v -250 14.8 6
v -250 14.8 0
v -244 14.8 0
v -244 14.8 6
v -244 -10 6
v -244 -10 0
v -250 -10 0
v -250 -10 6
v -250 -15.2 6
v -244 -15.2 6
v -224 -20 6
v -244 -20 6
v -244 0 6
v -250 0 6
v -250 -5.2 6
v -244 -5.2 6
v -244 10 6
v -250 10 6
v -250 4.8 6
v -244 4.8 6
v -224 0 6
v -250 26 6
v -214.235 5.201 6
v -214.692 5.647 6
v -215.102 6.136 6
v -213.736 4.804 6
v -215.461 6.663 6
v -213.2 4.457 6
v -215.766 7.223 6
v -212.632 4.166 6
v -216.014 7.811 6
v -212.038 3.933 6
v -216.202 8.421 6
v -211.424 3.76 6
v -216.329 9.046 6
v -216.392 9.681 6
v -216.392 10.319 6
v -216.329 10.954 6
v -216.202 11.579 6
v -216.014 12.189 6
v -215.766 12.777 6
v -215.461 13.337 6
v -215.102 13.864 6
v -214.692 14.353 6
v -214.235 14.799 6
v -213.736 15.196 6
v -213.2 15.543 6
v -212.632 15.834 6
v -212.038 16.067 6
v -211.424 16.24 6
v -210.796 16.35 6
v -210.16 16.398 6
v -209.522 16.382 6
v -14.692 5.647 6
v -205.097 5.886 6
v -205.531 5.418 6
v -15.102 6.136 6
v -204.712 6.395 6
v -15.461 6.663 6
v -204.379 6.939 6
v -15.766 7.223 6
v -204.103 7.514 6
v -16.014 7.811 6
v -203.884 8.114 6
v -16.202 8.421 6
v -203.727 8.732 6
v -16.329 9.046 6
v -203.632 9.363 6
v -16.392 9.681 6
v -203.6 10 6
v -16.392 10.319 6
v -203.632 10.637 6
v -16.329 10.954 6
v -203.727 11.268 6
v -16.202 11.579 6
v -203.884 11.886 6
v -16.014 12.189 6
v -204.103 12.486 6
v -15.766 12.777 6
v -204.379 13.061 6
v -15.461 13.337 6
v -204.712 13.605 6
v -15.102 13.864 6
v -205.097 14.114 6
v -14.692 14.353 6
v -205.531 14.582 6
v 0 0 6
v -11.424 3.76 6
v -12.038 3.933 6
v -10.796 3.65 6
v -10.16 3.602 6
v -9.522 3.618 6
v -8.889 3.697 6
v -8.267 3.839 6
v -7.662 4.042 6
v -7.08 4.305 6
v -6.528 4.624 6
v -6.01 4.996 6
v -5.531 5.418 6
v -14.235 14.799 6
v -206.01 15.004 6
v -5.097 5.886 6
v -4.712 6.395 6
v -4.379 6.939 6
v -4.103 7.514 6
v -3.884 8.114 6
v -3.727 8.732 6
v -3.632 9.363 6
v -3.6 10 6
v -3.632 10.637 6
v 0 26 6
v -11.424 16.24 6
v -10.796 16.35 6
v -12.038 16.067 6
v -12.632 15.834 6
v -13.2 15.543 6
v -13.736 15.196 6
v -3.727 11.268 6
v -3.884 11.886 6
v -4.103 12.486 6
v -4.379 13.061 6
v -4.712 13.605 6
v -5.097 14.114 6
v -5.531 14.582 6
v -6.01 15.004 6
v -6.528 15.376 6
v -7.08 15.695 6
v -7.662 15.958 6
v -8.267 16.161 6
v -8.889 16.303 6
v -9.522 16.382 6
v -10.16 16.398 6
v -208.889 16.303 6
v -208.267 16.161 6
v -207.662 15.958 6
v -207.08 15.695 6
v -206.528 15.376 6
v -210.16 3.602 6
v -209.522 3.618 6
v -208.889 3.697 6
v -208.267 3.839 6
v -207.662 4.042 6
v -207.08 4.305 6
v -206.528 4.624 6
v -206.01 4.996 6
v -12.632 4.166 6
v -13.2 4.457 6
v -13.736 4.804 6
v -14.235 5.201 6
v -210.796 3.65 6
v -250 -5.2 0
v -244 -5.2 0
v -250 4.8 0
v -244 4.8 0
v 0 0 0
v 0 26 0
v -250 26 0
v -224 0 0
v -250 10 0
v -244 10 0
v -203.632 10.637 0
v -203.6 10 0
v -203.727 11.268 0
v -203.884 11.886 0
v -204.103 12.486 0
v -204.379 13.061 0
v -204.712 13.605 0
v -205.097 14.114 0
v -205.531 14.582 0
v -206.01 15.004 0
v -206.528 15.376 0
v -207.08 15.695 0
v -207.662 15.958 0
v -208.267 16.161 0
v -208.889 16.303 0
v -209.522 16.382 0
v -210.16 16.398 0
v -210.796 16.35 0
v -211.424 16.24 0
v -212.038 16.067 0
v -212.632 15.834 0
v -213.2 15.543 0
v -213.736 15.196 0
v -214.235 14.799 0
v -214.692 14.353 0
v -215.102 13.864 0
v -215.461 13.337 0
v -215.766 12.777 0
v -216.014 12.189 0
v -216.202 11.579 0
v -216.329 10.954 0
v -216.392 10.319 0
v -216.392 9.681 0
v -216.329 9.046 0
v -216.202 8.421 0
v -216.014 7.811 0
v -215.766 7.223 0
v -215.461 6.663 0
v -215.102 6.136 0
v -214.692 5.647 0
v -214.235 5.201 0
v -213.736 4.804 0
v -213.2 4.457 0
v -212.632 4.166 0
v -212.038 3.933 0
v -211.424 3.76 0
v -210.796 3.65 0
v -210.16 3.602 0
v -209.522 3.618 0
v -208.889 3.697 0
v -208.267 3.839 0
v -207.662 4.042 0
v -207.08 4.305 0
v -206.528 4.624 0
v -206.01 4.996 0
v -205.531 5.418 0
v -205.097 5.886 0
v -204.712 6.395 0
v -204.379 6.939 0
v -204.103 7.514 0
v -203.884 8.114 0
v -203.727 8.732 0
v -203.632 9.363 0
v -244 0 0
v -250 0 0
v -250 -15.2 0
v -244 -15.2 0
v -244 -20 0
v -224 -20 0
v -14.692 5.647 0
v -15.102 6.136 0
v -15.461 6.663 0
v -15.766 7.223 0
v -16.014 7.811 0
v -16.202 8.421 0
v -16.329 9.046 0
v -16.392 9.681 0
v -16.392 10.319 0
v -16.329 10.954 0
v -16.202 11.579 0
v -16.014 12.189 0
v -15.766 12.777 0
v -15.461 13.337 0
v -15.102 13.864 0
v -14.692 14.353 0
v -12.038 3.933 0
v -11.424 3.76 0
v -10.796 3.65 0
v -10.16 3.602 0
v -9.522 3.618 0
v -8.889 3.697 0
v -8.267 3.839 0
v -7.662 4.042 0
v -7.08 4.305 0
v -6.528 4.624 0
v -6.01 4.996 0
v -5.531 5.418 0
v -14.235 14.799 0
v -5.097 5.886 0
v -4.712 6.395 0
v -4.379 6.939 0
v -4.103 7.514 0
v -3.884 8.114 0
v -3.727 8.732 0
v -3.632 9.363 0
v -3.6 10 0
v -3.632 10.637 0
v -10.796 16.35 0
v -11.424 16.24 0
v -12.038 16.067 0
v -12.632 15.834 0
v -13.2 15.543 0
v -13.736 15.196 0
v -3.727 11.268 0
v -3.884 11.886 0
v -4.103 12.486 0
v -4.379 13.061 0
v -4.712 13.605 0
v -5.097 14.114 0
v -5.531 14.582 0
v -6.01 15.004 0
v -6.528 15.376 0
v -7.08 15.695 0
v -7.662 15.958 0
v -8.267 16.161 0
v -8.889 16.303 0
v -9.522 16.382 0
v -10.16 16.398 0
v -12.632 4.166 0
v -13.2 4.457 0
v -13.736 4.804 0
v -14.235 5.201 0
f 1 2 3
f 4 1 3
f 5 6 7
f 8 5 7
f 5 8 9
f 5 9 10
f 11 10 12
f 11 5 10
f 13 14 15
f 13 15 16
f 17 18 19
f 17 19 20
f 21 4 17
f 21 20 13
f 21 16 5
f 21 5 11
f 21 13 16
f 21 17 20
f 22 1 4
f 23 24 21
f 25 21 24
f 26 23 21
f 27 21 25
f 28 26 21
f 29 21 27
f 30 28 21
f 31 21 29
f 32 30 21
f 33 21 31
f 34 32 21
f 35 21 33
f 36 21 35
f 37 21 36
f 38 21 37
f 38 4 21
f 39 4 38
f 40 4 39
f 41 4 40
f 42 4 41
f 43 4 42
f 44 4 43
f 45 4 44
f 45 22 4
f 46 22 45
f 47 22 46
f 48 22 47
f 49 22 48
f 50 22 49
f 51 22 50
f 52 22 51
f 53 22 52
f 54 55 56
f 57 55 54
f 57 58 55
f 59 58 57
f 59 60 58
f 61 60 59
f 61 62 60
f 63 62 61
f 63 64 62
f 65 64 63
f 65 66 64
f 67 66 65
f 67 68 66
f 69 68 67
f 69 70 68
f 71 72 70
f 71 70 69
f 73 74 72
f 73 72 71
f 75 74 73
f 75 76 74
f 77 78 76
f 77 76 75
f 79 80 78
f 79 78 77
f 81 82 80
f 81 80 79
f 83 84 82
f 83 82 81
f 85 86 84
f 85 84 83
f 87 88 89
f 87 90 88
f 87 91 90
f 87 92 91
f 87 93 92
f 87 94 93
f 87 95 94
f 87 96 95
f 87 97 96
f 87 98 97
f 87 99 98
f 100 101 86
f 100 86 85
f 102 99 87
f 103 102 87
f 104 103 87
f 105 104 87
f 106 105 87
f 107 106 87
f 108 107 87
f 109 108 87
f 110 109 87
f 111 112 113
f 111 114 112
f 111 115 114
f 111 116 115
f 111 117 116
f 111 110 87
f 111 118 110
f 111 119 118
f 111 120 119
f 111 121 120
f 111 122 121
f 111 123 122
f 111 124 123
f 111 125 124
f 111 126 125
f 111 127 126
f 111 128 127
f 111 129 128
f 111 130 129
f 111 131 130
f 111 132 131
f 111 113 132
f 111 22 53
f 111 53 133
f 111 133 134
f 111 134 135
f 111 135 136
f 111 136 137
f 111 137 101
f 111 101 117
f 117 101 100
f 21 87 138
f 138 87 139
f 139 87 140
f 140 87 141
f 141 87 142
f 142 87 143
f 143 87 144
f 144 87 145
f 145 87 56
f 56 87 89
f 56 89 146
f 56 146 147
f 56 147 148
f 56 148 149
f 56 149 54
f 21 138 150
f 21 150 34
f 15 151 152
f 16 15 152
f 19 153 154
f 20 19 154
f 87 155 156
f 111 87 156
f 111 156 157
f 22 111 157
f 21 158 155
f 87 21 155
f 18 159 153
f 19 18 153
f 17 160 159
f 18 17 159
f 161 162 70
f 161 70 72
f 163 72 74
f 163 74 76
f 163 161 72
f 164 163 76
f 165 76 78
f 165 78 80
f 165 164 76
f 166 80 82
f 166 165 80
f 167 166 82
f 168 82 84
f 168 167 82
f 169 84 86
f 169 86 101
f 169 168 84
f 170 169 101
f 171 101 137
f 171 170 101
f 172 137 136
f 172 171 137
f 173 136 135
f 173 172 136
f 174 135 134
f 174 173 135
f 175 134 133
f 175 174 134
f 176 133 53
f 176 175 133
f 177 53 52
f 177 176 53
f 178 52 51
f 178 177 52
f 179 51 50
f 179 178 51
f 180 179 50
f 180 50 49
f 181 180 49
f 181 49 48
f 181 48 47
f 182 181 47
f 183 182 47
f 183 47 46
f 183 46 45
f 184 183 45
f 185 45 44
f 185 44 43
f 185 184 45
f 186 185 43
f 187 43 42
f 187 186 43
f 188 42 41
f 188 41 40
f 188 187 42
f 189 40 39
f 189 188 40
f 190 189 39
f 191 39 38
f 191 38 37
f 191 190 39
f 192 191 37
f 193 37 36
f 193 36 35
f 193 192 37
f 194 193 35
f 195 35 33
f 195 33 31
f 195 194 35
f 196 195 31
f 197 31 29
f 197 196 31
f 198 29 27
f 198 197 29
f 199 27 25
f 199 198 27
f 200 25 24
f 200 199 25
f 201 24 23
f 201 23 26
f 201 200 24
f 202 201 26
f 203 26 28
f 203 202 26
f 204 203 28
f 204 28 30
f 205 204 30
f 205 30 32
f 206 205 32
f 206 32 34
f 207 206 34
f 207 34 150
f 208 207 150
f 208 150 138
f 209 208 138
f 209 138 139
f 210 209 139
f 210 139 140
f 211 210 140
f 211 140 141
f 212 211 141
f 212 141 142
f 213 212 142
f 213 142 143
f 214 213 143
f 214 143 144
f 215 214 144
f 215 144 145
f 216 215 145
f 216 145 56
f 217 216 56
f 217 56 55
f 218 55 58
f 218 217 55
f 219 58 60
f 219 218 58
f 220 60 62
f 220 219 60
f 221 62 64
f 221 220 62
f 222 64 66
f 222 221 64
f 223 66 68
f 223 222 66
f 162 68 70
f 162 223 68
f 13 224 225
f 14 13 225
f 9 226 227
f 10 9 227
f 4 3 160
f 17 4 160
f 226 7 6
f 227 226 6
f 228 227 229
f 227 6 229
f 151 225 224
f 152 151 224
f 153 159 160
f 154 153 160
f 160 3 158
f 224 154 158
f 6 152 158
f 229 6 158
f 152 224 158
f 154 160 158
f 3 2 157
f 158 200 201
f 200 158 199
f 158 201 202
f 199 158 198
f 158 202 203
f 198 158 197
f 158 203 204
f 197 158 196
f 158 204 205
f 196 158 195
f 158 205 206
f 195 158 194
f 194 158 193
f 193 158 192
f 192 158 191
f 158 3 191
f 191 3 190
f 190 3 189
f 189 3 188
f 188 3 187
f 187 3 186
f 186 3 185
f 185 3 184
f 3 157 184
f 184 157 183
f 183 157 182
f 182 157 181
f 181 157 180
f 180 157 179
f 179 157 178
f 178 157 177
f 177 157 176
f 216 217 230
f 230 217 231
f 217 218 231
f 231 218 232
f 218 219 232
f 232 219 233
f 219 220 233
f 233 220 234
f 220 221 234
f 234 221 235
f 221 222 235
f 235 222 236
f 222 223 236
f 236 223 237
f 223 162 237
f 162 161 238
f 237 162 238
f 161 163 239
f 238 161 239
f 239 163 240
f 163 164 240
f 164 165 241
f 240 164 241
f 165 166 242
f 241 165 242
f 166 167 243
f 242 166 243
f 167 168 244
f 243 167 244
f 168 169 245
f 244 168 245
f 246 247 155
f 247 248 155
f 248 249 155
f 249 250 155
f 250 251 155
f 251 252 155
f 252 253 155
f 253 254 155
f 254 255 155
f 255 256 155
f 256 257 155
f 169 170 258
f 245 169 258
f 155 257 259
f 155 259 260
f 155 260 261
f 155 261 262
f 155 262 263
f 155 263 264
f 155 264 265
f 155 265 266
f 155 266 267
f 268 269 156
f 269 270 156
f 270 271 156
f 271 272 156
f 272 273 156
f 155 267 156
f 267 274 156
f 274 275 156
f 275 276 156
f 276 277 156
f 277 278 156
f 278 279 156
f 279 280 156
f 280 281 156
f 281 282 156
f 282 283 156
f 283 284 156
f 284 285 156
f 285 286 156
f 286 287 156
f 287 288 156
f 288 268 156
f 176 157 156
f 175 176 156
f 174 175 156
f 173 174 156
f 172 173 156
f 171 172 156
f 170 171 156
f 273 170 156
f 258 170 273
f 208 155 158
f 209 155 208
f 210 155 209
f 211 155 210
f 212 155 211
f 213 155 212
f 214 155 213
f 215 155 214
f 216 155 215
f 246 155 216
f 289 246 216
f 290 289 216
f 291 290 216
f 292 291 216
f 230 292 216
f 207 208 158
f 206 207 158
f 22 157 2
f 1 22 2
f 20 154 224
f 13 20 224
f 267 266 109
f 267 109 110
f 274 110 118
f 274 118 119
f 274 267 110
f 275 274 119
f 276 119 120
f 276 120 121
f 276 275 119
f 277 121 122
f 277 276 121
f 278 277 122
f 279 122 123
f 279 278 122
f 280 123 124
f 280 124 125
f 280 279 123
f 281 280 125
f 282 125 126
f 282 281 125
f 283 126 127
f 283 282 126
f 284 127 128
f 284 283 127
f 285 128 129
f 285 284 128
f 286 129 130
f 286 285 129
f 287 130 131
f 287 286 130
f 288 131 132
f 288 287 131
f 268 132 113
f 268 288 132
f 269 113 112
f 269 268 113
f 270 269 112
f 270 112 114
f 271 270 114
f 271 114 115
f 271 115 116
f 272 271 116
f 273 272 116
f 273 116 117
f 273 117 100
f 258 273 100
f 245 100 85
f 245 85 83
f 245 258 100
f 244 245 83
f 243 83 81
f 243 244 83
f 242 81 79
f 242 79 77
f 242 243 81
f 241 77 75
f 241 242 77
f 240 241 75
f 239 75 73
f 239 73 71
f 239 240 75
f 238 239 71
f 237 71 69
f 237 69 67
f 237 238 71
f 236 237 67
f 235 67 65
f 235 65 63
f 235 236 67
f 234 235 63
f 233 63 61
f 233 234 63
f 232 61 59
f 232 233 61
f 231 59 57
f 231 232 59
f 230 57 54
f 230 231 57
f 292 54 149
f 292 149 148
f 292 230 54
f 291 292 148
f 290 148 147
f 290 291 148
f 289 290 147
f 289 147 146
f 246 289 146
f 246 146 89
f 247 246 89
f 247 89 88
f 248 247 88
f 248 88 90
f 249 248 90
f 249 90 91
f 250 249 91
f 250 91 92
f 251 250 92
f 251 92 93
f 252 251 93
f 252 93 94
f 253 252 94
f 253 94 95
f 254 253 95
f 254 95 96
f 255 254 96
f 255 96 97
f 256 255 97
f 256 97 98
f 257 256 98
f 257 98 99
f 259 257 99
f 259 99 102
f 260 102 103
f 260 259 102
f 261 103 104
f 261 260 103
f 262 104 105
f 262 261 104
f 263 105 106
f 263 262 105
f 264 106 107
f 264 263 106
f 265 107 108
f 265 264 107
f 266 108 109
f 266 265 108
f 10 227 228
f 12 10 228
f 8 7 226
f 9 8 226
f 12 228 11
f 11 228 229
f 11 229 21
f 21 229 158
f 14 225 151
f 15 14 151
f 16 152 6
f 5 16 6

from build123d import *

# Parameters (mm, degrees)
ESQUISSE1_R        = 6.4
BOSS_EXTRU_1_DEPTH = 6


with BuildPart() as part:
    # Esquisse1 → Boss.-Extru.1 (new body)
    with BuildSketch(Plane.XY):
        Polygon((0, 0), (0, 26), (-250, 26), (-250, 20), (-250, 14.8), (-244, 14.8), (-244, 10), (-250, 10), (-250, 4.8), (-244, 4.8), (-244, 0), (-250, 0), (-250, -5.2), (-244, -5.2), (-244, -10), (-250, -10), (-250, -15.2), (-244, -15.2), (-244, -20), (-224, -20), (-224, 0), (-59.8, 0), align=None)
        with Locations((-210, 10)):
            Circle(ESQUISSE1_R, mode=Mode.SUBTRACT)
        with Locations((-10, 10)):
            Circle(ESQUISSE1_R, mode=Mode.SUBTRACT)
    extrude(amount=BOSS_EXTRU_1_DEPTH)


solid = part.part
